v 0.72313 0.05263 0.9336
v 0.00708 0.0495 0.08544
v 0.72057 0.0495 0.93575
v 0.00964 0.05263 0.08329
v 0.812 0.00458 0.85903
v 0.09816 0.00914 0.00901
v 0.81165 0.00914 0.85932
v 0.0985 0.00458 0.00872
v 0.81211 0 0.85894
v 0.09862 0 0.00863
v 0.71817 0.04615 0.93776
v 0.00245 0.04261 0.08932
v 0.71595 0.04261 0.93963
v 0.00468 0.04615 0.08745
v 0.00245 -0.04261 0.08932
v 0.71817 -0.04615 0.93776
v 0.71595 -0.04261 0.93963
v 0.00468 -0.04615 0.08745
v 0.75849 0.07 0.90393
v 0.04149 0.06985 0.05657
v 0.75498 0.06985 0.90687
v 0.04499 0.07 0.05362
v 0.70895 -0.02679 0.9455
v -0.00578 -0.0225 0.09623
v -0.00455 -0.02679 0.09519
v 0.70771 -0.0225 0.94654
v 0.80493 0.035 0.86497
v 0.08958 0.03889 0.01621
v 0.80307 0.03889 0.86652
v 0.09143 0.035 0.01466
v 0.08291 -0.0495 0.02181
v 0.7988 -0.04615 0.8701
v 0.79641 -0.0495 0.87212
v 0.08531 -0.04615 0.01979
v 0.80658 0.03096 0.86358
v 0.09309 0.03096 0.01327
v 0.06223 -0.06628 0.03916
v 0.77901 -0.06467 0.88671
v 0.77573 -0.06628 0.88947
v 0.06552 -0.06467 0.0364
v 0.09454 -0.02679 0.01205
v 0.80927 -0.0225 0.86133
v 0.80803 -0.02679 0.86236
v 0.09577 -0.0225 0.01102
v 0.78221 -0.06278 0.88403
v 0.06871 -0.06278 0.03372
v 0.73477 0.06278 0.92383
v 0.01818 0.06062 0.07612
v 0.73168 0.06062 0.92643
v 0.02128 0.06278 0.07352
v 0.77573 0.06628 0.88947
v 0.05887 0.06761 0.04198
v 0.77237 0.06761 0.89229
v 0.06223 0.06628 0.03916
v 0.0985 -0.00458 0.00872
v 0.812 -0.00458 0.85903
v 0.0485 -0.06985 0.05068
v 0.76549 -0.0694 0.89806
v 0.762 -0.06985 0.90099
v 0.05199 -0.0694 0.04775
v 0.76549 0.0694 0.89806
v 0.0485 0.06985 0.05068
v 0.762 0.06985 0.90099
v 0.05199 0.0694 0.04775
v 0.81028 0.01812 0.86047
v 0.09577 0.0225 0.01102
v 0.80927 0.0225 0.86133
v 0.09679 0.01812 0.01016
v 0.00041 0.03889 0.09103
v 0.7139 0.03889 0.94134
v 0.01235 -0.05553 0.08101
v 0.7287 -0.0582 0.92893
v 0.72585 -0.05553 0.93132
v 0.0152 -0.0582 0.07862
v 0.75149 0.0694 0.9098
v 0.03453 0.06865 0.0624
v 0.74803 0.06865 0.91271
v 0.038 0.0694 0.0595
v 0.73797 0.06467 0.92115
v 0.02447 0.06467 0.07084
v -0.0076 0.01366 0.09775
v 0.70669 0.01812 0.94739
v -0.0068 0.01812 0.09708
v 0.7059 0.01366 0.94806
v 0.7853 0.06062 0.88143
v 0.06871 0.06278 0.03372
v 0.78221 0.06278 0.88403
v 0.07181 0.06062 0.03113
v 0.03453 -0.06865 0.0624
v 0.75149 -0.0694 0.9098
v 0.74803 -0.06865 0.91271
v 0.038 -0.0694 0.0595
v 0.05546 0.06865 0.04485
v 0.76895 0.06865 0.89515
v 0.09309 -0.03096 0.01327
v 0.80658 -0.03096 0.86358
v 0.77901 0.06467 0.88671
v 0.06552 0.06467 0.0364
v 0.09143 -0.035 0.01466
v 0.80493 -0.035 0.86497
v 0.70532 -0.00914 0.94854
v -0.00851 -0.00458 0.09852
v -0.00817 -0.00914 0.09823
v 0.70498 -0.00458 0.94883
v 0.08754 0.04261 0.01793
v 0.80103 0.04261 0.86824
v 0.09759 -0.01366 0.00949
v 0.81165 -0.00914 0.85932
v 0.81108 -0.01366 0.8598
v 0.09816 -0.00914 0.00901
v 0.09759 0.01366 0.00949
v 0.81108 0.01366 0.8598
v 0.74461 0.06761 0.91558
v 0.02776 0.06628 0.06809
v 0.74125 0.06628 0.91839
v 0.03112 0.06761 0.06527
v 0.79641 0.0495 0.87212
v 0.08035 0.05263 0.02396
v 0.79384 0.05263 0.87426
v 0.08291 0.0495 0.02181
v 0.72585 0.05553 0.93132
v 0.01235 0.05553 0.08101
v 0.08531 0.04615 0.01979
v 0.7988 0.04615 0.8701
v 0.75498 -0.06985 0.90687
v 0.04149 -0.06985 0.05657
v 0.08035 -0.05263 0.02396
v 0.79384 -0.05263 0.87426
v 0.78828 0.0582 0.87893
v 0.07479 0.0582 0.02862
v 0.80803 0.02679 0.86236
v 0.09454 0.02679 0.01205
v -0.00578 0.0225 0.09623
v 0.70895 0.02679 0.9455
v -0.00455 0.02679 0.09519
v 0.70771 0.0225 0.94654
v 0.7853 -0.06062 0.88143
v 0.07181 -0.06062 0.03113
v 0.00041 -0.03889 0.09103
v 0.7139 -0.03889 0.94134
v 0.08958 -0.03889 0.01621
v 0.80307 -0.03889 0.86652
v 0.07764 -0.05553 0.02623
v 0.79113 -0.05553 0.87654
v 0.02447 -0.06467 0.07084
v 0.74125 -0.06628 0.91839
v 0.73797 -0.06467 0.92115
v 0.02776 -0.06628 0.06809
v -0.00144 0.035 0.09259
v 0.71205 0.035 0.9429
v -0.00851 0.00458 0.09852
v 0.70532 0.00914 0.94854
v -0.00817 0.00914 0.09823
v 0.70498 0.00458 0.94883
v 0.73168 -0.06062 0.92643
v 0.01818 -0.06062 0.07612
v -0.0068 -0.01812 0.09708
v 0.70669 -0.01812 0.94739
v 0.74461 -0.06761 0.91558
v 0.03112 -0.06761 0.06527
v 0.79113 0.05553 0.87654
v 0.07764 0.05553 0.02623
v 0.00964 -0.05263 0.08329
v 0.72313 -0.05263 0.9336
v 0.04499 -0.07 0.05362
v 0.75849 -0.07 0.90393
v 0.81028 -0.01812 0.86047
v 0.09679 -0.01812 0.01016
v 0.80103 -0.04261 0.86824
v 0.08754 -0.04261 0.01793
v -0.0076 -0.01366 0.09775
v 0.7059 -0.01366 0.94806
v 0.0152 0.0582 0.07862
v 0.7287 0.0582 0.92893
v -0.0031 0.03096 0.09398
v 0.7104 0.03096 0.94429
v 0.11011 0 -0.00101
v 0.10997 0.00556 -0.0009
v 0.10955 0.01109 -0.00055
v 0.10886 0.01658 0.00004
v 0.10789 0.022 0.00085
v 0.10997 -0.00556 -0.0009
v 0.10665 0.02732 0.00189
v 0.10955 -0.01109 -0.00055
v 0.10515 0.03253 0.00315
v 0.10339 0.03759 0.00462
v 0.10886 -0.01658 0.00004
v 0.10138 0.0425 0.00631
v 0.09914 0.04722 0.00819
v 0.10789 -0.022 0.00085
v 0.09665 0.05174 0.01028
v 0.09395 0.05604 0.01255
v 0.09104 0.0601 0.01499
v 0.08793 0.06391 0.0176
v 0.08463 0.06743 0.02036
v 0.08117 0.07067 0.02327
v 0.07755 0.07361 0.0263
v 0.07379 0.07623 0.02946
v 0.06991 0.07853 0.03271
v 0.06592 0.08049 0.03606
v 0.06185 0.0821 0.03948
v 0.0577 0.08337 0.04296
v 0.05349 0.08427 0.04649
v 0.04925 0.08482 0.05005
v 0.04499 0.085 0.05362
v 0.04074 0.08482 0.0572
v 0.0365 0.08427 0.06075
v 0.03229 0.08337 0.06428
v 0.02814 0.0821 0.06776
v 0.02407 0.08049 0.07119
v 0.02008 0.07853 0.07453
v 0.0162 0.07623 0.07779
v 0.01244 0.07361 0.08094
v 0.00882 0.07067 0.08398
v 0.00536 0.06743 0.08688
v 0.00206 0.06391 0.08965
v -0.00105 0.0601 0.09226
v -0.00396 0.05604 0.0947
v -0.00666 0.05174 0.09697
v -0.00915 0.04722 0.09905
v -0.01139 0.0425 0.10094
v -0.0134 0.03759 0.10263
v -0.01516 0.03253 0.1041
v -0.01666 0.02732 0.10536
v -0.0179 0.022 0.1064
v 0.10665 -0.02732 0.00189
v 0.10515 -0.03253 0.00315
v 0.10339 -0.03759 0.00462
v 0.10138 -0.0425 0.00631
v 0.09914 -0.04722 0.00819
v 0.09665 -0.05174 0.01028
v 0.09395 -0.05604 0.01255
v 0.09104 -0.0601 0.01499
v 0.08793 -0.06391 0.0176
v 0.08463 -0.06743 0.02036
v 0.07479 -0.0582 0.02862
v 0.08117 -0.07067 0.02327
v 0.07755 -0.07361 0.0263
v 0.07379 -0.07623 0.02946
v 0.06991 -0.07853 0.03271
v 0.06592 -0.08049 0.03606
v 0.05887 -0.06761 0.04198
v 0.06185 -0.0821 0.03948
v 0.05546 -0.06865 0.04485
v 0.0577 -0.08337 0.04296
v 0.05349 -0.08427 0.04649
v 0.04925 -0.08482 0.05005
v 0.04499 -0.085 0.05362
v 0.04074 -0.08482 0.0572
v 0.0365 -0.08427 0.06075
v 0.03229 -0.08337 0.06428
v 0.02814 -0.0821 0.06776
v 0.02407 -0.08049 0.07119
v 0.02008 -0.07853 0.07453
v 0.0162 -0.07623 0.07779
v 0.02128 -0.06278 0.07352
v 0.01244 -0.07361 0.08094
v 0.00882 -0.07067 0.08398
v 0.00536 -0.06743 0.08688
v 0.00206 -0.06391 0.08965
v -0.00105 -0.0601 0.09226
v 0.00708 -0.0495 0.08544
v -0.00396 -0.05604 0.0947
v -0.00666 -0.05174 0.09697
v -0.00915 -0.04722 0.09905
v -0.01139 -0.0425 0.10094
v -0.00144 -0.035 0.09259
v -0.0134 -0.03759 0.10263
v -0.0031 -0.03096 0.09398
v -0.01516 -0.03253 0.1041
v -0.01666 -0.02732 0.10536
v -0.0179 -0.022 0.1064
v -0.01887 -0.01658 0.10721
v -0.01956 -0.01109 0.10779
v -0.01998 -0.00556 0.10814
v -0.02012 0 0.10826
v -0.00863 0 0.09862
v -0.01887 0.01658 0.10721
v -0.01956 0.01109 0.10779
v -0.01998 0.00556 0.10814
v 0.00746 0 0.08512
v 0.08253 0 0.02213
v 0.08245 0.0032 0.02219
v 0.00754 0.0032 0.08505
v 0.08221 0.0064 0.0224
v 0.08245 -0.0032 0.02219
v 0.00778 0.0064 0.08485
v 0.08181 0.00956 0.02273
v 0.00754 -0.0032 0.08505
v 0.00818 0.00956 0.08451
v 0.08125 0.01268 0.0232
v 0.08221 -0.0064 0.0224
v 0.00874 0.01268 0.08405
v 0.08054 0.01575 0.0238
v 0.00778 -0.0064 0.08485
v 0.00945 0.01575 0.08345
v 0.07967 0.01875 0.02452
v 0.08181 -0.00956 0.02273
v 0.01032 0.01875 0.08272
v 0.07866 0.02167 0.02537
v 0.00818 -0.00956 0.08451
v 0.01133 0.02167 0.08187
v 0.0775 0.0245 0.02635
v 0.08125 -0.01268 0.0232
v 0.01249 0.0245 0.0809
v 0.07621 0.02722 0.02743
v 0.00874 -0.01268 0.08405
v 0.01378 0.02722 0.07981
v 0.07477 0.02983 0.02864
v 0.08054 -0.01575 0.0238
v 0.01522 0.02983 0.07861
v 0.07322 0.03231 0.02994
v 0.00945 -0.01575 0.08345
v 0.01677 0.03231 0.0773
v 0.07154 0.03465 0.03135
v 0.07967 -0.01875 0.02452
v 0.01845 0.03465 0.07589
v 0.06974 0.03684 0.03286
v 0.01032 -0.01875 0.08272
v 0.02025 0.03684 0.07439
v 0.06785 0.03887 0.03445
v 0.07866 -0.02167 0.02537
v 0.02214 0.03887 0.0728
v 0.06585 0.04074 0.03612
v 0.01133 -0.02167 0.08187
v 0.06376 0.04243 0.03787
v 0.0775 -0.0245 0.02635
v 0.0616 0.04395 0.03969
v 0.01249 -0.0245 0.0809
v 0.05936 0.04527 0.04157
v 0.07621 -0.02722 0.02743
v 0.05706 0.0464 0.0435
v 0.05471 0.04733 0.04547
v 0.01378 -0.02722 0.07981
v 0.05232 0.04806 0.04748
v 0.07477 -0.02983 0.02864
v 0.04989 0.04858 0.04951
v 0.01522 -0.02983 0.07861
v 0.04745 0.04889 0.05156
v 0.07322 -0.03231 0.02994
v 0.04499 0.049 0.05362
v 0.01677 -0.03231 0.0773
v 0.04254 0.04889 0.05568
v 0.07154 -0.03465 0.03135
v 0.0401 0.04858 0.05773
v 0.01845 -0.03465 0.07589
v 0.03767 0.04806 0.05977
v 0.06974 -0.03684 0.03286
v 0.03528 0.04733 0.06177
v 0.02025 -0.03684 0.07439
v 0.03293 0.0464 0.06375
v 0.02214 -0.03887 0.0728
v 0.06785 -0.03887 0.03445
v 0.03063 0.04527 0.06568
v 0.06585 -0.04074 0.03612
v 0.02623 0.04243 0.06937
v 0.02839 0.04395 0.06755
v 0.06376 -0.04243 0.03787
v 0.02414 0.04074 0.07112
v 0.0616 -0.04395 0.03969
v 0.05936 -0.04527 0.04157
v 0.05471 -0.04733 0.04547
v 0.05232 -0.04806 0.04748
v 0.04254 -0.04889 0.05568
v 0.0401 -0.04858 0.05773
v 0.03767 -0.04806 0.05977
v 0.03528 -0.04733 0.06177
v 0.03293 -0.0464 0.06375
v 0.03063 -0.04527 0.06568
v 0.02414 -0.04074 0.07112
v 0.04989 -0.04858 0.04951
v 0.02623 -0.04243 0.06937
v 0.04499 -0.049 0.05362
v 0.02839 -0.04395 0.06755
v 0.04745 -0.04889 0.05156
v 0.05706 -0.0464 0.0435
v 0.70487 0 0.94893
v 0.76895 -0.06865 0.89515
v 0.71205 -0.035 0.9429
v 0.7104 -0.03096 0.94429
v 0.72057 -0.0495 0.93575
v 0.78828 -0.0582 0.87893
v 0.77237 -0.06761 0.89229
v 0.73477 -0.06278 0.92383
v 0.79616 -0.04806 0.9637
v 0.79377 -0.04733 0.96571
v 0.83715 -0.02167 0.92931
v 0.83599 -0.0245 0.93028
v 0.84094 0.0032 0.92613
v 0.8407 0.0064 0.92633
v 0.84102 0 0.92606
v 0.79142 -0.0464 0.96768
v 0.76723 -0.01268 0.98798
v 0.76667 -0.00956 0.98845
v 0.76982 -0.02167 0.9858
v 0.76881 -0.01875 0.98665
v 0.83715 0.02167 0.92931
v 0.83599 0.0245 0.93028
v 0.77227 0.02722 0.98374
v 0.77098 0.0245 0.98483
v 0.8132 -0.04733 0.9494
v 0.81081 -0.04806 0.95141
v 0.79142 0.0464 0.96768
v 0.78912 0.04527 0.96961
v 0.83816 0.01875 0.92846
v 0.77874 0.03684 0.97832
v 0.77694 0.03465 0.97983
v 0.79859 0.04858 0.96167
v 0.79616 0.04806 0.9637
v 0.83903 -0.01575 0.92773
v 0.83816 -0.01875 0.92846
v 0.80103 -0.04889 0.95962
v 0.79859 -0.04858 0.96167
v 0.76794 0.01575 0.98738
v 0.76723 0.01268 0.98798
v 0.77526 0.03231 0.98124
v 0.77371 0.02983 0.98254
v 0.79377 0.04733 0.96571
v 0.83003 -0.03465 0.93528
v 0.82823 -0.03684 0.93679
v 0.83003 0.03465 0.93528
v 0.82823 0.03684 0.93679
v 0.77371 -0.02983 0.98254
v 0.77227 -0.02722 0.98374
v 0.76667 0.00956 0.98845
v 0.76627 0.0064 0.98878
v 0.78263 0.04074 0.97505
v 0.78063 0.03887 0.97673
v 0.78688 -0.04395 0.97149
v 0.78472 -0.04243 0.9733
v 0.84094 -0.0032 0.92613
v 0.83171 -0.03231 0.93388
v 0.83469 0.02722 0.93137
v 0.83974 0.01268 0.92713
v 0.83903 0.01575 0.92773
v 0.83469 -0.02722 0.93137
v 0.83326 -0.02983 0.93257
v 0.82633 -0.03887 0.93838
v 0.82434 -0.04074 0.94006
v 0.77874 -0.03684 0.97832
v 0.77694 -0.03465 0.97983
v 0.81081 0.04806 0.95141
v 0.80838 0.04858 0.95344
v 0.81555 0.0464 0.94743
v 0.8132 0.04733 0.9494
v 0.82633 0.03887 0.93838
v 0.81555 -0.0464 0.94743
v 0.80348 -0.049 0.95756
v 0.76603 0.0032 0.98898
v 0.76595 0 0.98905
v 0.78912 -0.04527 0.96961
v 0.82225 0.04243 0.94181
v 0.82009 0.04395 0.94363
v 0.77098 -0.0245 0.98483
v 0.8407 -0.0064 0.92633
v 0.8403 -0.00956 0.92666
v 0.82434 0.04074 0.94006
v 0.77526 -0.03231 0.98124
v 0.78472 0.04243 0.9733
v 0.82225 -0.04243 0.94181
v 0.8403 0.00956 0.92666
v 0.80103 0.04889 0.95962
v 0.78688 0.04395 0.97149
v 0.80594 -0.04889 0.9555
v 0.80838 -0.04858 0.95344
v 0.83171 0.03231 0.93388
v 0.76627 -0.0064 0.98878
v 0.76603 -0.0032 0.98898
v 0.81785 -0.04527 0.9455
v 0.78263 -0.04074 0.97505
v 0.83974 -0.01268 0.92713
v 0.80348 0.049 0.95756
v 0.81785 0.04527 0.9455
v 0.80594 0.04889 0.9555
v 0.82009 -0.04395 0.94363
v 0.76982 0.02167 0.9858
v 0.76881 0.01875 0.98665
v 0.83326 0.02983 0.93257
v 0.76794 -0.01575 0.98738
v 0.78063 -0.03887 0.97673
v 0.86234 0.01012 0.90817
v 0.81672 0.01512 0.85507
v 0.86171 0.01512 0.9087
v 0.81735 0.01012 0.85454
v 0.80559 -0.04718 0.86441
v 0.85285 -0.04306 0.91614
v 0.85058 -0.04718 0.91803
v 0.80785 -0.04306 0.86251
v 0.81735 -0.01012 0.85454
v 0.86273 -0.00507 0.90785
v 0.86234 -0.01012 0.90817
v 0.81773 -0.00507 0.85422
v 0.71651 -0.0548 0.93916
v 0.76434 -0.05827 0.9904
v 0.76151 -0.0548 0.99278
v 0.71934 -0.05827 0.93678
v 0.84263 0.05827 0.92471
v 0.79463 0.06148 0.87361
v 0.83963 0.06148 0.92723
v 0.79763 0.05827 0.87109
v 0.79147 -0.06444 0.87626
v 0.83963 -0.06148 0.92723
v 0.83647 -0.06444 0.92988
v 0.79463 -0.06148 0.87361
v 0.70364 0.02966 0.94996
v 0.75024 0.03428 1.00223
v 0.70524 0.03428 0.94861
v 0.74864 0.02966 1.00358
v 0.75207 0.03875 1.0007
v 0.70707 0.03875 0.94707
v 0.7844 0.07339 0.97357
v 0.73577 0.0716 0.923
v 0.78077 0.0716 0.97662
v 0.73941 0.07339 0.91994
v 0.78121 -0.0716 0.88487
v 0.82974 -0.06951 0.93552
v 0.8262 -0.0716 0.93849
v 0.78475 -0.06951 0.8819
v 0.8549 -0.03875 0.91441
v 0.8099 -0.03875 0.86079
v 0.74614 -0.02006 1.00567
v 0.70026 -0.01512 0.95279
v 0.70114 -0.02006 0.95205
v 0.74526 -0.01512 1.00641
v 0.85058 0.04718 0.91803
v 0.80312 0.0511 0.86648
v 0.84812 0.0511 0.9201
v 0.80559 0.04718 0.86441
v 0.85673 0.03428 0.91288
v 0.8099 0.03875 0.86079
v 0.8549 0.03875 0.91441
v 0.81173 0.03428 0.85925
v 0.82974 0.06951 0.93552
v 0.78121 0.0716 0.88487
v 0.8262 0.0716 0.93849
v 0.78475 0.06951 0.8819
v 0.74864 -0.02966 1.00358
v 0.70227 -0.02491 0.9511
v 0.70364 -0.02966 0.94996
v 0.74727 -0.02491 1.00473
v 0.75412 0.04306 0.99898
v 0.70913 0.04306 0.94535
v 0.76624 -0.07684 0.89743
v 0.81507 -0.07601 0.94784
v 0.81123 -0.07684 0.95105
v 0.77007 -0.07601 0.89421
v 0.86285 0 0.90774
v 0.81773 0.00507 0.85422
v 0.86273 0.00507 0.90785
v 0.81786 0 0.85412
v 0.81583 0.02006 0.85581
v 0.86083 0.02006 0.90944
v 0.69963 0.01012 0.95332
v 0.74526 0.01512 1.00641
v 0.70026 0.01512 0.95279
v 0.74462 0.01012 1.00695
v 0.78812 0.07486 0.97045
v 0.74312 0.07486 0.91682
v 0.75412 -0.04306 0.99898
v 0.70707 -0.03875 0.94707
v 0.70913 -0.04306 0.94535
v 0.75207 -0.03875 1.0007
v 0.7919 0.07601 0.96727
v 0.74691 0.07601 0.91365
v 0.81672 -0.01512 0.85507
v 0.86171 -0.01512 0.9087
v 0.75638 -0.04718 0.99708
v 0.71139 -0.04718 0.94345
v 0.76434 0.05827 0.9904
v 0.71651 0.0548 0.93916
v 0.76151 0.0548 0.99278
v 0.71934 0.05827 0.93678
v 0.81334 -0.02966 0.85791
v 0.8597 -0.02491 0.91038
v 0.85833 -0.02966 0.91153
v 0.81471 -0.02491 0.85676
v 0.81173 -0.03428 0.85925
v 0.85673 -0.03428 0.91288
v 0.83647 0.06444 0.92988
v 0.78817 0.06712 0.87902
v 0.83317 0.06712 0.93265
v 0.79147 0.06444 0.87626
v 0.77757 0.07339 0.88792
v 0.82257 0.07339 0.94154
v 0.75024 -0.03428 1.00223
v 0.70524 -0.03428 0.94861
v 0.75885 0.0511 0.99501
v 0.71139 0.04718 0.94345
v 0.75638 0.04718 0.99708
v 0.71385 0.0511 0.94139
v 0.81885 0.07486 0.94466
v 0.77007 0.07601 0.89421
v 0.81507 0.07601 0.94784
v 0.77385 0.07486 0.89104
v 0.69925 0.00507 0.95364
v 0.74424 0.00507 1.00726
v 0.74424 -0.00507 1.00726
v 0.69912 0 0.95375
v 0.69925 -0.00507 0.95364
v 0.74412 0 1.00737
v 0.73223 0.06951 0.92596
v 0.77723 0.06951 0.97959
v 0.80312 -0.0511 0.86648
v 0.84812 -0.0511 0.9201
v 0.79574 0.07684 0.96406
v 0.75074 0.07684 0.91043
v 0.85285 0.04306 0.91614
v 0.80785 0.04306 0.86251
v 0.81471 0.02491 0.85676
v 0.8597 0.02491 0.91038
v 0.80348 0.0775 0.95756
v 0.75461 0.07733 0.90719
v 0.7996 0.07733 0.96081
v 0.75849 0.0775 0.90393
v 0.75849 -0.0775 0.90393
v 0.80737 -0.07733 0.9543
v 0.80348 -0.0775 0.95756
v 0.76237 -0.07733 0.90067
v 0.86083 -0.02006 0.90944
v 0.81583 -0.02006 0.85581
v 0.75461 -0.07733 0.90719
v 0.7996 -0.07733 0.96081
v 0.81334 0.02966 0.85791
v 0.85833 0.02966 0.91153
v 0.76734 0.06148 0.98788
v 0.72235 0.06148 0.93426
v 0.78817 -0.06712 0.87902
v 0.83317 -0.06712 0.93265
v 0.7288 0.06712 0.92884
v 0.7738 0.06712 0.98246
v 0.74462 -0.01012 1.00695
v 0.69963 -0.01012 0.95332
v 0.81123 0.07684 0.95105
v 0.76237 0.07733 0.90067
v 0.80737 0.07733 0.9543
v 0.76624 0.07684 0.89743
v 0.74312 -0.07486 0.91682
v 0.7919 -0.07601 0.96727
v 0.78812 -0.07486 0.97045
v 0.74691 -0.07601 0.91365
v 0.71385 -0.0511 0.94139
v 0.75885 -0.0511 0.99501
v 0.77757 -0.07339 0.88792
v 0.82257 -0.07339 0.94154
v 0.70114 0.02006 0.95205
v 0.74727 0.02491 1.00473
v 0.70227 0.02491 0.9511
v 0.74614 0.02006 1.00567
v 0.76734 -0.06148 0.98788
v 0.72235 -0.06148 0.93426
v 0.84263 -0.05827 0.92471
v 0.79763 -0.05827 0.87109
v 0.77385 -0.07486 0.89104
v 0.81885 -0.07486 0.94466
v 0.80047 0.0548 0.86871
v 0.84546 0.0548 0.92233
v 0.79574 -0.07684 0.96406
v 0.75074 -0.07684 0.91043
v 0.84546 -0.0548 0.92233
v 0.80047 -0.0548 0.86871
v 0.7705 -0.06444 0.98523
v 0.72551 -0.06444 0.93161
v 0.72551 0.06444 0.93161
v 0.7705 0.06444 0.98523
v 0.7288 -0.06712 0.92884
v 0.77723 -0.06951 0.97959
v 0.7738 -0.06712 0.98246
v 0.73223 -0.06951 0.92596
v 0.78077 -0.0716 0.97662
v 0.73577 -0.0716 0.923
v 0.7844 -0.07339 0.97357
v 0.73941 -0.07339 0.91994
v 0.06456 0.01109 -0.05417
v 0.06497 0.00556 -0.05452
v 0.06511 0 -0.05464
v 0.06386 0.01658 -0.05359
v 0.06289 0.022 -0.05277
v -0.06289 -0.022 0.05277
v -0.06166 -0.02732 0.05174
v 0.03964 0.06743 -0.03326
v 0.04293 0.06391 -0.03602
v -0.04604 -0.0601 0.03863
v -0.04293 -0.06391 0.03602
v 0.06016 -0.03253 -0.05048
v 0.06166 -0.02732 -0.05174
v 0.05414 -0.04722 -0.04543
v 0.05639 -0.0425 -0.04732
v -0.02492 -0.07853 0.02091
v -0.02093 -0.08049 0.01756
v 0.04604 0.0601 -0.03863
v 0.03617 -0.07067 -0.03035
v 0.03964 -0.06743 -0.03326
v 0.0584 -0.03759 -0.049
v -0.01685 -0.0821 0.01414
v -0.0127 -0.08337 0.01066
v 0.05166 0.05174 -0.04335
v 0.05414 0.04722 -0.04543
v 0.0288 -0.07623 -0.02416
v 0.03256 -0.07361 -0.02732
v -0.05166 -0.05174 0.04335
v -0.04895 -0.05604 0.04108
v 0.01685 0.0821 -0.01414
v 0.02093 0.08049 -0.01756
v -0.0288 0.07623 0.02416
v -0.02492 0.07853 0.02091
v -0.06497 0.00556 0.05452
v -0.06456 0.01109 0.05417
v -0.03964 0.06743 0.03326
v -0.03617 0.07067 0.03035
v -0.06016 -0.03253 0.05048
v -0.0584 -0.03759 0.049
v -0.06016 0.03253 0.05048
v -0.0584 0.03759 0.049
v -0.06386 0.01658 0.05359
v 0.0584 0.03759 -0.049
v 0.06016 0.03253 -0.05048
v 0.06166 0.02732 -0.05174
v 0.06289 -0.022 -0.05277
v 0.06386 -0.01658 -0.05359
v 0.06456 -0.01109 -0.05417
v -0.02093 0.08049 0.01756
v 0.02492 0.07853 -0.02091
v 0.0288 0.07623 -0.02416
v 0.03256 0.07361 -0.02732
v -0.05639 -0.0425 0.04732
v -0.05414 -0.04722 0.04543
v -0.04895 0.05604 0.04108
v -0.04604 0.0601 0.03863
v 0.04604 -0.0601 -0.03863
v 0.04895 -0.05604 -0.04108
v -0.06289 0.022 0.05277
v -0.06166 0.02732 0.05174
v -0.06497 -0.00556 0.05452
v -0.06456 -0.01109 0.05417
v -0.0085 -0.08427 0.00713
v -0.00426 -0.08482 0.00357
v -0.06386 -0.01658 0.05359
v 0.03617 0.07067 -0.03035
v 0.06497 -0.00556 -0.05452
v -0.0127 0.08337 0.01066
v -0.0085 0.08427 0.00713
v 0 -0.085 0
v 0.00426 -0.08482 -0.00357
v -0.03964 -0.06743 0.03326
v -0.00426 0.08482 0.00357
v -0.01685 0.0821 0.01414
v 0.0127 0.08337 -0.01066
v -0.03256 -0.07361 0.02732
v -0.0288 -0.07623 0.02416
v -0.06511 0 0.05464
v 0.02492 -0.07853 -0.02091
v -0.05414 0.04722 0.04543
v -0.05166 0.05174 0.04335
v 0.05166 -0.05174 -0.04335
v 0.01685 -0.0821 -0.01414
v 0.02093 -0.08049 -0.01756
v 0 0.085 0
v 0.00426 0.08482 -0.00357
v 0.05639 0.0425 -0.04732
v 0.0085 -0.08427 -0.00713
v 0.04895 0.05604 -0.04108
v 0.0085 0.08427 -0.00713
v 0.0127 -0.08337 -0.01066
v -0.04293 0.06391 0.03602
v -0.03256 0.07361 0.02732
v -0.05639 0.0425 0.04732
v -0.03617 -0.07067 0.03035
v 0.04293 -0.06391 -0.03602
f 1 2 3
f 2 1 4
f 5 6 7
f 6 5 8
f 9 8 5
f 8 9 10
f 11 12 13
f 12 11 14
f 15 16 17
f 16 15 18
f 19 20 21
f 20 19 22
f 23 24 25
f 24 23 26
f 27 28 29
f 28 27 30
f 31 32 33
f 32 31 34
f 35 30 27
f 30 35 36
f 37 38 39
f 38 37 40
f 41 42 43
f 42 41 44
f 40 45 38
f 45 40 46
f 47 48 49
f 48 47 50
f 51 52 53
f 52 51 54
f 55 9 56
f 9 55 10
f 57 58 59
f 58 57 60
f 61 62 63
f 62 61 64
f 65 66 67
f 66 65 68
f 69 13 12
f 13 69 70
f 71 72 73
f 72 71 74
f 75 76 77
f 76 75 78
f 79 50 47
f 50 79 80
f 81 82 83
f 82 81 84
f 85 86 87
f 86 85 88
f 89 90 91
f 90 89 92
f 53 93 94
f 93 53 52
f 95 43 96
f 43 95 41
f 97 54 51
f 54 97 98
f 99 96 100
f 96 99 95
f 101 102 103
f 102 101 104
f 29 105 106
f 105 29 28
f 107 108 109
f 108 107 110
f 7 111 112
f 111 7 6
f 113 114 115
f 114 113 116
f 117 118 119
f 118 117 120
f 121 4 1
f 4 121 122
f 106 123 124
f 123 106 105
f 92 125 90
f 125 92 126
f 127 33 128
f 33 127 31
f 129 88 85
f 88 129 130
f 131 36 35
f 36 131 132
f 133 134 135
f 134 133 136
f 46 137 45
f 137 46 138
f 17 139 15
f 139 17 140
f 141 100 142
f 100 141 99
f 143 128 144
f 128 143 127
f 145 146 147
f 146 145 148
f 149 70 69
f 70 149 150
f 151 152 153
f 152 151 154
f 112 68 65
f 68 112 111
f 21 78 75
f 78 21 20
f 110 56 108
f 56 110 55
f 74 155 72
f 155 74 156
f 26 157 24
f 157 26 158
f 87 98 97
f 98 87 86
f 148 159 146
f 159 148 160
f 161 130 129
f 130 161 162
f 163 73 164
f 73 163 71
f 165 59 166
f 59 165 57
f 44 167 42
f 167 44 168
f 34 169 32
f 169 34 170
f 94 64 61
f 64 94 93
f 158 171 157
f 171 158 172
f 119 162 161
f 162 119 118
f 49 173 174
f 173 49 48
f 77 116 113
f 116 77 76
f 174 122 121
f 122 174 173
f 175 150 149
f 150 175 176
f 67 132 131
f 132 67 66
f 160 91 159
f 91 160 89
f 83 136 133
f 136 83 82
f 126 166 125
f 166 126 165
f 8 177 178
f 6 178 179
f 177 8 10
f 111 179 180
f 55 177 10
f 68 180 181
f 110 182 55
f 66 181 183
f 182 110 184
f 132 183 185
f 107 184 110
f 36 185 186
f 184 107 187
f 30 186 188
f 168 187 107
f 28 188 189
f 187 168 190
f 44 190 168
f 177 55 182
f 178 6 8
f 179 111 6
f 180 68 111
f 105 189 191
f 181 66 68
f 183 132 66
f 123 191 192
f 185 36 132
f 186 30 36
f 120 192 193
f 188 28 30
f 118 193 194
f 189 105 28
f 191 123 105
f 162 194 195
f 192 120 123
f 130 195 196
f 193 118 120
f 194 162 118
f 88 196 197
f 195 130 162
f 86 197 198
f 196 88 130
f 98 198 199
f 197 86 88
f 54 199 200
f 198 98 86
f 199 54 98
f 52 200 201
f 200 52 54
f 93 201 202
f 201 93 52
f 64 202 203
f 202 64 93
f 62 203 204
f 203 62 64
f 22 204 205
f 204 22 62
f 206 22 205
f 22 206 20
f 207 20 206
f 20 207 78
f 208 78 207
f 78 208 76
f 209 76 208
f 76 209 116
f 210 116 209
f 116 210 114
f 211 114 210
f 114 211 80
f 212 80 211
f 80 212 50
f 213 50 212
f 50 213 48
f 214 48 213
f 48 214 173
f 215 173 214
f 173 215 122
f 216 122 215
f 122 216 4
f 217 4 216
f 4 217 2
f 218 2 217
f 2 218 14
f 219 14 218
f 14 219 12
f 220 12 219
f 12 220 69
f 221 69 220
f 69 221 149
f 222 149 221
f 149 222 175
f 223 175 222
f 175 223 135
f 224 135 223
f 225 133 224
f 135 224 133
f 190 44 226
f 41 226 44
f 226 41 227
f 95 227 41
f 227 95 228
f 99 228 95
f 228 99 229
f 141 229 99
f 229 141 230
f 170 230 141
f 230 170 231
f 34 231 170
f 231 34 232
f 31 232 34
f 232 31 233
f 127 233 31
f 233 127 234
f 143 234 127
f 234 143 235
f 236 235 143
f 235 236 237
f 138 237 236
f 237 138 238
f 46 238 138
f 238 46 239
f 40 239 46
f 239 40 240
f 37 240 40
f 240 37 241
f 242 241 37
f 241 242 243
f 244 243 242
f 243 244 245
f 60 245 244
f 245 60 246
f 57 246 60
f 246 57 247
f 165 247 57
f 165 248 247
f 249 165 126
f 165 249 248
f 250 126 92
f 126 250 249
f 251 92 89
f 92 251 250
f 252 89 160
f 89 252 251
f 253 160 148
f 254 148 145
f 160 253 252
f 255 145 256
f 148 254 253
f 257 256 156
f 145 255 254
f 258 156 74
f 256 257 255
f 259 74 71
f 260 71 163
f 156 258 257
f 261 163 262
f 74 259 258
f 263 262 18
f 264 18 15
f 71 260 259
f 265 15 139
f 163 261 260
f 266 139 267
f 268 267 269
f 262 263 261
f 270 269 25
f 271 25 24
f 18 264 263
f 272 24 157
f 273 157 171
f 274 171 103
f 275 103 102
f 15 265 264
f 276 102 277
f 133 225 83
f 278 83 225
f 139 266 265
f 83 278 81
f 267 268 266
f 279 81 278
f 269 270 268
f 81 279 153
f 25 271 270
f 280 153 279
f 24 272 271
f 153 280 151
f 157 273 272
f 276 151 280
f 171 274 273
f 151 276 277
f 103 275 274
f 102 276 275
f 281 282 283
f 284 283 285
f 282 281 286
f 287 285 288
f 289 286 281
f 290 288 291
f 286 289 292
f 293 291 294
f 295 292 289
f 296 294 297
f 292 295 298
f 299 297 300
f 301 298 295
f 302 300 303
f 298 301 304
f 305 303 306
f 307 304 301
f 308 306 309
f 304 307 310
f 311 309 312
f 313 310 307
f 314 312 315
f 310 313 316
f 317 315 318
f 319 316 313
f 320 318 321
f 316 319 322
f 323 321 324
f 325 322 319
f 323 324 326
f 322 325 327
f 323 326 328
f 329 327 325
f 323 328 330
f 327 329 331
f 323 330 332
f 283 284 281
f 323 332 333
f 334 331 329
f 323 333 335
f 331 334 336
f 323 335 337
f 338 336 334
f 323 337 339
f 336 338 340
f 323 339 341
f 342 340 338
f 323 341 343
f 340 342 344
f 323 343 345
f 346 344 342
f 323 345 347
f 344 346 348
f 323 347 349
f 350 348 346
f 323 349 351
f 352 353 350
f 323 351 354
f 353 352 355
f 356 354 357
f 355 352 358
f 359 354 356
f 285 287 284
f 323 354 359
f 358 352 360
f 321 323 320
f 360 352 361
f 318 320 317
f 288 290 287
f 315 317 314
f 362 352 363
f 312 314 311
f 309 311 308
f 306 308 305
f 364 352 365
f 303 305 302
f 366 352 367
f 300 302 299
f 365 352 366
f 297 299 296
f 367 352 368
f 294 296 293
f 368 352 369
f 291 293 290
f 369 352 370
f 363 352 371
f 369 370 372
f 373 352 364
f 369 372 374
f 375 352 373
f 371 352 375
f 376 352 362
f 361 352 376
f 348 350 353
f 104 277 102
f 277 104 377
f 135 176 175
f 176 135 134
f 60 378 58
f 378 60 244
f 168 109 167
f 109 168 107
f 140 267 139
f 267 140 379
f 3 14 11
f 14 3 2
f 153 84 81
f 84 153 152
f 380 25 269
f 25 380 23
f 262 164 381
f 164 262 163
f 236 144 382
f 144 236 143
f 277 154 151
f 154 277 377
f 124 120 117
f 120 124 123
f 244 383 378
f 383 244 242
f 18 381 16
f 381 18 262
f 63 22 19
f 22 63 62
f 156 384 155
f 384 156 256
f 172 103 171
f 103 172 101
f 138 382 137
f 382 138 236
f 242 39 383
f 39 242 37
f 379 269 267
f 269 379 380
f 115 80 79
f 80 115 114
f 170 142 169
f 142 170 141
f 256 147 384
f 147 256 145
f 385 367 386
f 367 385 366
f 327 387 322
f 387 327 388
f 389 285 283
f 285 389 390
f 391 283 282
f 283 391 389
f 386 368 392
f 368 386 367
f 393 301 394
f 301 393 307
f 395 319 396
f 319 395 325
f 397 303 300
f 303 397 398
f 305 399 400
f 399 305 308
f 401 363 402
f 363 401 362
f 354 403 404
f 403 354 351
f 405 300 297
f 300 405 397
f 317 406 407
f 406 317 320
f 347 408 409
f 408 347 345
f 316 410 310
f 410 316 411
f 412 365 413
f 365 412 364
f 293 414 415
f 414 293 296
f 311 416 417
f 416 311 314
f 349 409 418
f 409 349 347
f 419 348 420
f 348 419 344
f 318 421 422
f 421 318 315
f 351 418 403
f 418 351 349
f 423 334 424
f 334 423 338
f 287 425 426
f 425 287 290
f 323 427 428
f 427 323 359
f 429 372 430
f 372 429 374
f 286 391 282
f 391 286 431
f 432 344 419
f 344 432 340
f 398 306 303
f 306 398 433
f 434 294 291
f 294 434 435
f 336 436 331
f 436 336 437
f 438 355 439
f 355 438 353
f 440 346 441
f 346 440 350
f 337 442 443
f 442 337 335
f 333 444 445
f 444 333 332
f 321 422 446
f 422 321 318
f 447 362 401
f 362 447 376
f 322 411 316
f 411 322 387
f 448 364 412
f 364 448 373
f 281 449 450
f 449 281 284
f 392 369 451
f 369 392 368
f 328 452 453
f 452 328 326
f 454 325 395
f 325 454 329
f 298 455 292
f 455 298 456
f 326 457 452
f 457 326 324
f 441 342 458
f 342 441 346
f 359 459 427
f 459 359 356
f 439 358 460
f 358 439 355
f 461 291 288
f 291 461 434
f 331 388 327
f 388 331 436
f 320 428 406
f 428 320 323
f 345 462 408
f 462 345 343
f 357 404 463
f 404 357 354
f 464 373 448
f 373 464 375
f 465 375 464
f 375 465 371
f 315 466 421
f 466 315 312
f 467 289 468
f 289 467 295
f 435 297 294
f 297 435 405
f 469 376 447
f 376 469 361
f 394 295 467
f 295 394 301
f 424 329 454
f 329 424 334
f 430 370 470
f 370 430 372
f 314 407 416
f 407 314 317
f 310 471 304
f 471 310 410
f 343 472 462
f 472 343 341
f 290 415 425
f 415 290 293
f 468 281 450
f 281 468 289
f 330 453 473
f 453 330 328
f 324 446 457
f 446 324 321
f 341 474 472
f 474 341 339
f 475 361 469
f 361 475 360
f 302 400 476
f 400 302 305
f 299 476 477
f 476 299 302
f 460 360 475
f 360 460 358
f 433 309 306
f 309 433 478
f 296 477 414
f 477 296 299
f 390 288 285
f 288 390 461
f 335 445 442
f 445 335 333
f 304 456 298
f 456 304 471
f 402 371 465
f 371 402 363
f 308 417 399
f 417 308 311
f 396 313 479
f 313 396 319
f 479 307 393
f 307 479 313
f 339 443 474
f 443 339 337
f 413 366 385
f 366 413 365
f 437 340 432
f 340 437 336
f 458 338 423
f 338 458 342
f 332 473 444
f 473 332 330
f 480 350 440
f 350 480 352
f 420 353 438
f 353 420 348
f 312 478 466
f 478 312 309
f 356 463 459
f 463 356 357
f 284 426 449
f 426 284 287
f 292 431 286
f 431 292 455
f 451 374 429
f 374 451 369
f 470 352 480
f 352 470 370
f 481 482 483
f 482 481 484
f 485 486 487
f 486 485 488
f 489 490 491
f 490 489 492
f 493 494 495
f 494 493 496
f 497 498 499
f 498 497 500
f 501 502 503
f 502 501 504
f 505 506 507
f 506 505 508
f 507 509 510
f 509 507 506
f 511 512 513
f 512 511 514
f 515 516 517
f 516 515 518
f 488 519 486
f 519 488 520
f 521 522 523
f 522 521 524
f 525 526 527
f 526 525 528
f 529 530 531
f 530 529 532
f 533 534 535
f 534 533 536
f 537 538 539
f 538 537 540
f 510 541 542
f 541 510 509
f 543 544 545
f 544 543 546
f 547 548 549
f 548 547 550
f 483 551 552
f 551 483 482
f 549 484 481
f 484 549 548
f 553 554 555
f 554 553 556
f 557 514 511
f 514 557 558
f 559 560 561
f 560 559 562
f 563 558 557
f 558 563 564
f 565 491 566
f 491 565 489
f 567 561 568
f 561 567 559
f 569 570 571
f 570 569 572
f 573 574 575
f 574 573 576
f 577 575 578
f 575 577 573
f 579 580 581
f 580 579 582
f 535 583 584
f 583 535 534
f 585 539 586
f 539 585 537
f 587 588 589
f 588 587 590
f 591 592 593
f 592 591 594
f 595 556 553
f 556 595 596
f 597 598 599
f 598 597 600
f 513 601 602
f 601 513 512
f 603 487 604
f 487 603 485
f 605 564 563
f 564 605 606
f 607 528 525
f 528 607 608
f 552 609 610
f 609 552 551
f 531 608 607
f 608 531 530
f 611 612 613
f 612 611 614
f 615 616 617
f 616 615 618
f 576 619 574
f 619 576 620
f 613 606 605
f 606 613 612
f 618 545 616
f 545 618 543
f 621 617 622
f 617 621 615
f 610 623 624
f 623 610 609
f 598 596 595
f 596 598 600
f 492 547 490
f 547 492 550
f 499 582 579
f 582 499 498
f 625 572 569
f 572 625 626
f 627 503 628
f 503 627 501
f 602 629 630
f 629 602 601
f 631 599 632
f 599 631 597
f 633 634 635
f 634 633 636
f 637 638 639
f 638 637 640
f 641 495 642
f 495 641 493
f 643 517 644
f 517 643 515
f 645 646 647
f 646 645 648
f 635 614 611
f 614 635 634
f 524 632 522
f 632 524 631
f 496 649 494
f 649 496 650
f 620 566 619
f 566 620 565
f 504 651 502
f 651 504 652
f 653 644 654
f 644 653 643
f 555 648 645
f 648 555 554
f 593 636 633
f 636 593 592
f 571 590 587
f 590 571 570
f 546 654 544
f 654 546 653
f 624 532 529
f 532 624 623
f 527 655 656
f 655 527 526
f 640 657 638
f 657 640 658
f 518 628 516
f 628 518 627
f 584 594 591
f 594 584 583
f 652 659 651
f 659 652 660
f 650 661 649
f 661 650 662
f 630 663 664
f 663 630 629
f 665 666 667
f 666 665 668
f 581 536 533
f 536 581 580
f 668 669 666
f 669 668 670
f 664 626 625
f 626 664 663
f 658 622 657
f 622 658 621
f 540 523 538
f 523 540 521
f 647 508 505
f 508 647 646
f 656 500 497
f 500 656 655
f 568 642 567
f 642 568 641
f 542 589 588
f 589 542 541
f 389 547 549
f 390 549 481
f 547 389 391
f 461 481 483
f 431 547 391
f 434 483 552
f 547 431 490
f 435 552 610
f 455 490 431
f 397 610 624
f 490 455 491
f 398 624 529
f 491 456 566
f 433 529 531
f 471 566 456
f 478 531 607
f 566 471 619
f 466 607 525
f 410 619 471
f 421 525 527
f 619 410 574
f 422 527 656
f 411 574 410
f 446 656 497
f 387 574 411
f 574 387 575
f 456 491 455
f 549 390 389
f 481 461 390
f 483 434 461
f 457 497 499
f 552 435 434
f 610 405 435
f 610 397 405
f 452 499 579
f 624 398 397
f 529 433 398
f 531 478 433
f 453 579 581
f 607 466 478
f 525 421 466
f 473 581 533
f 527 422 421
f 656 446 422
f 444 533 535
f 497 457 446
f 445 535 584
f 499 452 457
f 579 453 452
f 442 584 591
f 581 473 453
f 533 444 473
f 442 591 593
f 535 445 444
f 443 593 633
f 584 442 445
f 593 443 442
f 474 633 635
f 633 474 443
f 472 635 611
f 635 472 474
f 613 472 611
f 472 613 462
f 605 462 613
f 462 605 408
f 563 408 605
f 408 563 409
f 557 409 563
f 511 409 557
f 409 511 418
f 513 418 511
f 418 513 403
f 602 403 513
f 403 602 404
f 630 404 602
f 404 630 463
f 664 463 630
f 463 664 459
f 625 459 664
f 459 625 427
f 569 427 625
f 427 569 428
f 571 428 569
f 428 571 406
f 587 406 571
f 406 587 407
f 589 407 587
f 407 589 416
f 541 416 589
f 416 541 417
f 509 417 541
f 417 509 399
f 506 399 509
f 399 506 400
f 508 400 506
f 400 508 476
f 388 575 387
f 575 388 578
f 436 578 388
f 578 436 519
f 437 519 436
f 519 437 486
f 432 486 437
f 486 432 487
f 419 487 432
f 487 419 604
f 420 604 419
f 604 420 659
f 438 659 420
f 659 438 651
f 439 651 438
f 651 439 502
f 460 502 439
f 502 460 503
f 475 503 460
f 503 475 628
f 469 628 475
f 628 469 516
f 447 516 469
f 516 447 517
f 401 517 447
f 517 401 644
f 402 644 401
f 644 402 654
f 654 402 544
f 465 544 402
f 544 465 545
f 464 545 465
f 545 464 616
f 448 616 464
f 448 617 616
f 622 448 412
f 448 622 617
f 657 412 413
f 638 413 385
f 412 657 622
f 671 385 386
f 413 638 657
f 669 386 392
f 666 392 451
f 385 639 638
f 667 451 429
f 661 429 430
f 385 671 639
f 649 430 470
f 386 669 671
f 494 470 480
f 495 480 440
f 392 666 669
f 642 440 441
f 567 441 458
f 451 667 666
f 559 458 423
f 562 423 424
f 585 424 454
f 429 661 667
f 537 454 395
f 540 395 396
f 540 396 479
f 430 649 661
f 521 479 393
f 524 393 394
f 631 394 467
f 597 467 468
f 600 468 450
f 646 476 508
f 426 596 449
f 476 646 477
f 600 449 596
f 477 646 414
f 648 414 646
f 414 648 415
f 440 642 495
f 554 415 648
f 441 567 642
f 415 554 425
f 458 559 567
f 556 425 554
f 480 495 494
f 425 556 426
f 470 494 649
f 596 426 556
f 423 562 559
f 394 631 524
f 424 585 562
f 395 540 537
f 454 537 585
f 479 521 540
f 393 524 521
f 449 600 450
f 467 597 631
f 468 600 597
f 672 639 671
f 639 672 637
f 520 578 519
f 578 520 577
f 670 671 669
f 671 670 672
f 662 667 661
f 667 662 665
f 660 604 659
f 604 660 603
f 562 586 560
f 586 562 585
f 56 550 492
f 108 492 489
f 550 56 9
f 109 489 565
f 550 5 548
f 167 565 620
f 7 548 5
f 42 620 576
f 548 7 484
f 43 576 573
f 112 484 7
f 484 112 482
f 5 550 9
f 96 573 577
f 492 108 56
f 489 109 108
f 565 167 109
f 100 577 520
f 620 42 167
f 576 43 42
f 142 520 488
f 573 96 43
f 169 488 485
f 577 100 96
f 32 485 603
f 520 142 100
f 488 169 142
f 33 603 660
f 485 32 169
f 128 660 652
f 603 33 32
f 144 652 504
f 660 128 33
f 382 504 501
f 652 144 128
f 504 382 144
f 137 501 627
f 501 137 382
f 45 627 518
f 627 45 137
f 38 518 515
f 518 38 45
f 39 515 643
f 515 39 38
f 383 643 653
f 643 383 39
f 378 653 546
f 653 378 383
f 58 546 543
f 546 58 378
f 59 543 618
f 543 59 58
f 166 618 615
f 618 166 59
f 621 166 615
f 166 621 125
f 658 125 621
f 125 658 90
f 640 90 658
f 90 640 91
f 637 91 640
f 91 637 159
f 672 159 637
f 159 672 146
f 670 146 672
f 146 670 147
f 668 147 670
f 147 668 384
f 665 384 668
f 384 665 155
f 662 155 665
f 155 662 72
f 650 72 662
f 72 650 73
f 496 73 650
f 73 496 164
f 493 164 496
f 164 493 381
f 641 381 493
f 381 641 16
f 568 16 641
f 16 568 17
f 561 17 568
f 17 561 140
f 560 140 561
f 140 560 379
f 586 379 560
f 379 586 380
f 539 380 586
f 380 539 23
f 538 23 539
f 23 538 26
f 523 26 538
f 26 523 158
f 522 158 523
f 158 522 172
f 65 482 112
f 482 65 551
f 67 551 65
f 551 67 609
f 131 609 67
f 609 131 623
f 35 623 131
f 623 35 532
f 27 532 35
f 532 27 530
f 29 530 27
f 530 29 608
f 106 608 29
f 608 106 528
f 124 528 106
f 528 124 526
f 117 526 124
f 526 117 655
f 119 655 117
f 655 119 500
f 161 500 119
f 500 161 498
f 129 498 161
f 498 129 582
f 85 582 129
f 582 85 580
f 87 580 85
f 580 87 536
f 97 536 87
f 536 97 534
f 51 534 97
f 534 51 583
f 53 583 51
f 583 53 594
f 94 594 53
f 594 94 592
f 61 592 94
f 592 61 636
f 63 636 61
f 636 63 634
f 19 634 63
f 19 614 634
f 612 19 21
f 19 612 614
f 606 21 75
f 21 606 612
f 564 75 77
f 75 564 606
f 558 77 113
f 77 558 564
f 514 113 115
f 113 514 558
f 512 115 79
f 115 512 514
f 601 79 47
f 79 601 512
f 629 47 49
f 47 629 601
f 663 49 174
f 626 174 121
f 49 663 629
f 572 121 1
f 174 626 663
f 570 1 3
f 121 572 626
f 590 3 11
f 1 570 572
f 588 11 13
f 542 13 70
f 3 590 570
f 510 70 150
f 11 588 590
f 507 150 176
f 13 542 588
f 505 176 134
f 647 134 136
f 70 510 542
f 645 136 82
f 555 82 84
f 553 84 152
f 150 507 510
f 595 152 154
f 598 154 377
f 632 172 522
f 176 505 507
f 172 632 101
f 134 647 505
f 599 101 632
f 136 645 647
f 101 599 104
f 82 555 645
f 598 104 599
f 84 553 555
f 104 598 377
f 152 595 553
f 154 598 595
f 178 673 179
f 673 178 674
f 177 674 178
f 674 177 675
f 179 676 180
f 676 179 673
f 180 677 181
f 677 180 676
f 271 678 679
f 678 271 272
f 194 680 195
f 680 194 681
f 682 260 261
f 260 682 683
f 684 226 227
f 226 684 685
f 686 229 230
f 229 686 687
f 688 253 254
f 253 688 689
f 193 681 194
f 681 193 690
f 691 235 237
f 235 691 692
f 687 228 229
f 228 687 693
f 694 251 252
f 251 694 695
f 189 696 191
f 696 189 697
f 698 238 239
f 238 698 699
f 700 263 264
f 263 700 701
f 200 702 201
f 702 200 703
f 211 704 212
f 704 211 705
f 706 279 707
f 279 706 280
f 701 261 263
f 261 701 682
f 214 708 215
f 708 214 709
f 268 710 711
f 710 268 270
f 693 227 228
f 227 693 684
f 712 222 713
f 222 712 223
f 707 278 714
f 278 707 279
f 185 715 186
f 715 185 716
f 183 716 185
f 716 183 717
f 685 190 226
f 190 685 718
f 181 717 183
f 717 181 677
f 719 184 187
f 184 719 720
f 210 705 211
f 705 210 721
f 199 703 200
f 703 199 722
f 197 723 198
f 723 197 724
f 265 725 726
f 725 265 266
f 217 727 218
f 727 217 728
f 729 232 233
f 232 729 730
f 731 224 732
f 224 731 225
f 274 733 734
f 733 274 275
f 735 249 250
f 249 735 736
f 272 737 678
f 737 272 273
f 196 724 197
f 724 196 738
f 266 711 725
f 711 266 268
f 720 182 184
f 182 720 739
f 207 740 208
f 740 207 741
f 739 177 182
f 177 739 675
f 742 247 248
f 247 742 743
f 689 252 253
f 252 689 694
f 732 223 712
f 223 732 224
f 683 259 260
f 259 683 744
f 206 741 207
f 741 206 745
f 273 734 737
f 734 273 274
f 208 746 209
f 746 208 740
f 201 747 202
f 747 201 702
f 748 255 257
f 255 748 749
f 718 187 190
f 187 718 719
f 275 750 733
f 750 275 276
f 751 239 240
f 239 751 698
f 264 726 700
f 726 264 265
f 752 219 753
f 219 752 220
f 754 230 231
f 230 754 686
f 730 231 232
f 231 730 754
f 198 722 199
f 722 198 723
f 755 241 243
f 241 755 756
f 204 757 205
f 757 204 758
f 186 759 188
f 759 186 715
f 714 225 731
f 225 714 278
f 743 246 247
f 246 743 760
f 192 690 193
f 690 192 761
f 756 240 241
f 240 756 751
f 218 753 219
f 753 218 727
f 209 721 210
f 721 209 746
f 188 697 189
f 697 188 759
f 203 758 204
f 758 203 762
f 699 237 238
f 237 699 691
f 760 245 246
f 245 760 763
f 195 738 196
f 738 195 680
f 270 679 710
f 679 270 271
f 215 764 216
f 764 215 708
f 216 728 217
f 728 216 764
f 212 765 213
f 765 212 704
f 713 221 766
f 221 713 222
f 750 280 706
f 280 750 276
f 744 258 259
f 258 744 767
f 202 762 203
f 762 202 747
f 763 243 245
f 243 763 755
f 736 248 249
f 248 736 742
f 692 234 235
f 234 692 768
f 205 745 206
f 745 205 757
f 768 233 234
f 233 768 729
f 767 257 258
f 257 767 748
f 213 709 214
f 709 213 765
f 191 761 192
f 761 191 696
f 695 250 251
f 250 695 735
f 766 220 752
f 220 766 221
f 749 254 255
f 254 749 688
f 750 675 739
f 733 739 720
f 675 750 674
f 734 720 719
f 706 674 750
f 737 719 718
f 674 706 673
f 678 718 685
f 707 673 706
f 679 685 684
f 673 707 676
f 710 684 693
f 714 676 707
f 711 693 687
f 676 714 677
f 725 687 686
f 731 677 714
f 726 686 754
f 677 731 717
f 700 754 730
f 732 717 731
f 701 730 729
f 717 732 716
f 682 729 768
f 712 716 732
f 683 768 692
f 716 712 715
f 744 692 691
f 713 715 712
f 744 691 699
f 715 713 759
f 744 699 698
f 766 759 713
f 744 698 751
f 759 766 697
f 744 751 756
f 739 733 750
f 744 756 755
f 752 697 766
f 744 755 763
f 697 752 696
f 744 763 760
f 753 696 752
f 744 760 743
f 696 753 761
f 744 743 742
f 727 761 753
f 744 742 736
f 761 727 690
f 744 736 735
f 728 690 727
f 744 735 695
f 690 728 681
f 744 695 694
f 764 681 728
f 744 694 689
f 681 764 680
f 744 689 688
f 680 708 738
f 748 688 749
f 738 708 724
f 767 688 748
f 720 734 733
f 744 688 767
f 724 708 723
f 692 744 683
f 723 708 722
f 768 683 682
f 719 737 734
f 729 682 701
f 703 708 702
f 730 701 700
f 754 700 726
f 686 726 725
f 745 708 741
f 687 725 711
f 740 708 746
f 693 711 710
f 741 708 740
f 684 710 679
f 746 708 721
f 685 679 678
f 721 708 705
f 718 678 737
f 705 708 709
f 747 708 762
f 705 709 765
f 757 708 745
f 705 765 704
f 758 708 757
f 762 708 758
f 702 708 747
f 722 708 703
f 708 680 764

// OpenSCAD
// CylinderMesh.Create(true,true): 96 segments; radii .070/.049, .085, .0775; heights 0,.07,1.18,1.23,1.25 m.
$fn=96; rotate([0,40,0]) color("#8E9296") { difference(){translate([0,0,.07]) cylinder(r=.07,h=1.16); translate([0,0,.069]) cylinder(r=.049,h=1.162);} cylinder(r=.085,h=.07); difference(){translate([0,0,1.18]) cylinder(r=.0775,h=.07); translate([0,0,1.179]) cylinder(r=.049,h=.072);} }
